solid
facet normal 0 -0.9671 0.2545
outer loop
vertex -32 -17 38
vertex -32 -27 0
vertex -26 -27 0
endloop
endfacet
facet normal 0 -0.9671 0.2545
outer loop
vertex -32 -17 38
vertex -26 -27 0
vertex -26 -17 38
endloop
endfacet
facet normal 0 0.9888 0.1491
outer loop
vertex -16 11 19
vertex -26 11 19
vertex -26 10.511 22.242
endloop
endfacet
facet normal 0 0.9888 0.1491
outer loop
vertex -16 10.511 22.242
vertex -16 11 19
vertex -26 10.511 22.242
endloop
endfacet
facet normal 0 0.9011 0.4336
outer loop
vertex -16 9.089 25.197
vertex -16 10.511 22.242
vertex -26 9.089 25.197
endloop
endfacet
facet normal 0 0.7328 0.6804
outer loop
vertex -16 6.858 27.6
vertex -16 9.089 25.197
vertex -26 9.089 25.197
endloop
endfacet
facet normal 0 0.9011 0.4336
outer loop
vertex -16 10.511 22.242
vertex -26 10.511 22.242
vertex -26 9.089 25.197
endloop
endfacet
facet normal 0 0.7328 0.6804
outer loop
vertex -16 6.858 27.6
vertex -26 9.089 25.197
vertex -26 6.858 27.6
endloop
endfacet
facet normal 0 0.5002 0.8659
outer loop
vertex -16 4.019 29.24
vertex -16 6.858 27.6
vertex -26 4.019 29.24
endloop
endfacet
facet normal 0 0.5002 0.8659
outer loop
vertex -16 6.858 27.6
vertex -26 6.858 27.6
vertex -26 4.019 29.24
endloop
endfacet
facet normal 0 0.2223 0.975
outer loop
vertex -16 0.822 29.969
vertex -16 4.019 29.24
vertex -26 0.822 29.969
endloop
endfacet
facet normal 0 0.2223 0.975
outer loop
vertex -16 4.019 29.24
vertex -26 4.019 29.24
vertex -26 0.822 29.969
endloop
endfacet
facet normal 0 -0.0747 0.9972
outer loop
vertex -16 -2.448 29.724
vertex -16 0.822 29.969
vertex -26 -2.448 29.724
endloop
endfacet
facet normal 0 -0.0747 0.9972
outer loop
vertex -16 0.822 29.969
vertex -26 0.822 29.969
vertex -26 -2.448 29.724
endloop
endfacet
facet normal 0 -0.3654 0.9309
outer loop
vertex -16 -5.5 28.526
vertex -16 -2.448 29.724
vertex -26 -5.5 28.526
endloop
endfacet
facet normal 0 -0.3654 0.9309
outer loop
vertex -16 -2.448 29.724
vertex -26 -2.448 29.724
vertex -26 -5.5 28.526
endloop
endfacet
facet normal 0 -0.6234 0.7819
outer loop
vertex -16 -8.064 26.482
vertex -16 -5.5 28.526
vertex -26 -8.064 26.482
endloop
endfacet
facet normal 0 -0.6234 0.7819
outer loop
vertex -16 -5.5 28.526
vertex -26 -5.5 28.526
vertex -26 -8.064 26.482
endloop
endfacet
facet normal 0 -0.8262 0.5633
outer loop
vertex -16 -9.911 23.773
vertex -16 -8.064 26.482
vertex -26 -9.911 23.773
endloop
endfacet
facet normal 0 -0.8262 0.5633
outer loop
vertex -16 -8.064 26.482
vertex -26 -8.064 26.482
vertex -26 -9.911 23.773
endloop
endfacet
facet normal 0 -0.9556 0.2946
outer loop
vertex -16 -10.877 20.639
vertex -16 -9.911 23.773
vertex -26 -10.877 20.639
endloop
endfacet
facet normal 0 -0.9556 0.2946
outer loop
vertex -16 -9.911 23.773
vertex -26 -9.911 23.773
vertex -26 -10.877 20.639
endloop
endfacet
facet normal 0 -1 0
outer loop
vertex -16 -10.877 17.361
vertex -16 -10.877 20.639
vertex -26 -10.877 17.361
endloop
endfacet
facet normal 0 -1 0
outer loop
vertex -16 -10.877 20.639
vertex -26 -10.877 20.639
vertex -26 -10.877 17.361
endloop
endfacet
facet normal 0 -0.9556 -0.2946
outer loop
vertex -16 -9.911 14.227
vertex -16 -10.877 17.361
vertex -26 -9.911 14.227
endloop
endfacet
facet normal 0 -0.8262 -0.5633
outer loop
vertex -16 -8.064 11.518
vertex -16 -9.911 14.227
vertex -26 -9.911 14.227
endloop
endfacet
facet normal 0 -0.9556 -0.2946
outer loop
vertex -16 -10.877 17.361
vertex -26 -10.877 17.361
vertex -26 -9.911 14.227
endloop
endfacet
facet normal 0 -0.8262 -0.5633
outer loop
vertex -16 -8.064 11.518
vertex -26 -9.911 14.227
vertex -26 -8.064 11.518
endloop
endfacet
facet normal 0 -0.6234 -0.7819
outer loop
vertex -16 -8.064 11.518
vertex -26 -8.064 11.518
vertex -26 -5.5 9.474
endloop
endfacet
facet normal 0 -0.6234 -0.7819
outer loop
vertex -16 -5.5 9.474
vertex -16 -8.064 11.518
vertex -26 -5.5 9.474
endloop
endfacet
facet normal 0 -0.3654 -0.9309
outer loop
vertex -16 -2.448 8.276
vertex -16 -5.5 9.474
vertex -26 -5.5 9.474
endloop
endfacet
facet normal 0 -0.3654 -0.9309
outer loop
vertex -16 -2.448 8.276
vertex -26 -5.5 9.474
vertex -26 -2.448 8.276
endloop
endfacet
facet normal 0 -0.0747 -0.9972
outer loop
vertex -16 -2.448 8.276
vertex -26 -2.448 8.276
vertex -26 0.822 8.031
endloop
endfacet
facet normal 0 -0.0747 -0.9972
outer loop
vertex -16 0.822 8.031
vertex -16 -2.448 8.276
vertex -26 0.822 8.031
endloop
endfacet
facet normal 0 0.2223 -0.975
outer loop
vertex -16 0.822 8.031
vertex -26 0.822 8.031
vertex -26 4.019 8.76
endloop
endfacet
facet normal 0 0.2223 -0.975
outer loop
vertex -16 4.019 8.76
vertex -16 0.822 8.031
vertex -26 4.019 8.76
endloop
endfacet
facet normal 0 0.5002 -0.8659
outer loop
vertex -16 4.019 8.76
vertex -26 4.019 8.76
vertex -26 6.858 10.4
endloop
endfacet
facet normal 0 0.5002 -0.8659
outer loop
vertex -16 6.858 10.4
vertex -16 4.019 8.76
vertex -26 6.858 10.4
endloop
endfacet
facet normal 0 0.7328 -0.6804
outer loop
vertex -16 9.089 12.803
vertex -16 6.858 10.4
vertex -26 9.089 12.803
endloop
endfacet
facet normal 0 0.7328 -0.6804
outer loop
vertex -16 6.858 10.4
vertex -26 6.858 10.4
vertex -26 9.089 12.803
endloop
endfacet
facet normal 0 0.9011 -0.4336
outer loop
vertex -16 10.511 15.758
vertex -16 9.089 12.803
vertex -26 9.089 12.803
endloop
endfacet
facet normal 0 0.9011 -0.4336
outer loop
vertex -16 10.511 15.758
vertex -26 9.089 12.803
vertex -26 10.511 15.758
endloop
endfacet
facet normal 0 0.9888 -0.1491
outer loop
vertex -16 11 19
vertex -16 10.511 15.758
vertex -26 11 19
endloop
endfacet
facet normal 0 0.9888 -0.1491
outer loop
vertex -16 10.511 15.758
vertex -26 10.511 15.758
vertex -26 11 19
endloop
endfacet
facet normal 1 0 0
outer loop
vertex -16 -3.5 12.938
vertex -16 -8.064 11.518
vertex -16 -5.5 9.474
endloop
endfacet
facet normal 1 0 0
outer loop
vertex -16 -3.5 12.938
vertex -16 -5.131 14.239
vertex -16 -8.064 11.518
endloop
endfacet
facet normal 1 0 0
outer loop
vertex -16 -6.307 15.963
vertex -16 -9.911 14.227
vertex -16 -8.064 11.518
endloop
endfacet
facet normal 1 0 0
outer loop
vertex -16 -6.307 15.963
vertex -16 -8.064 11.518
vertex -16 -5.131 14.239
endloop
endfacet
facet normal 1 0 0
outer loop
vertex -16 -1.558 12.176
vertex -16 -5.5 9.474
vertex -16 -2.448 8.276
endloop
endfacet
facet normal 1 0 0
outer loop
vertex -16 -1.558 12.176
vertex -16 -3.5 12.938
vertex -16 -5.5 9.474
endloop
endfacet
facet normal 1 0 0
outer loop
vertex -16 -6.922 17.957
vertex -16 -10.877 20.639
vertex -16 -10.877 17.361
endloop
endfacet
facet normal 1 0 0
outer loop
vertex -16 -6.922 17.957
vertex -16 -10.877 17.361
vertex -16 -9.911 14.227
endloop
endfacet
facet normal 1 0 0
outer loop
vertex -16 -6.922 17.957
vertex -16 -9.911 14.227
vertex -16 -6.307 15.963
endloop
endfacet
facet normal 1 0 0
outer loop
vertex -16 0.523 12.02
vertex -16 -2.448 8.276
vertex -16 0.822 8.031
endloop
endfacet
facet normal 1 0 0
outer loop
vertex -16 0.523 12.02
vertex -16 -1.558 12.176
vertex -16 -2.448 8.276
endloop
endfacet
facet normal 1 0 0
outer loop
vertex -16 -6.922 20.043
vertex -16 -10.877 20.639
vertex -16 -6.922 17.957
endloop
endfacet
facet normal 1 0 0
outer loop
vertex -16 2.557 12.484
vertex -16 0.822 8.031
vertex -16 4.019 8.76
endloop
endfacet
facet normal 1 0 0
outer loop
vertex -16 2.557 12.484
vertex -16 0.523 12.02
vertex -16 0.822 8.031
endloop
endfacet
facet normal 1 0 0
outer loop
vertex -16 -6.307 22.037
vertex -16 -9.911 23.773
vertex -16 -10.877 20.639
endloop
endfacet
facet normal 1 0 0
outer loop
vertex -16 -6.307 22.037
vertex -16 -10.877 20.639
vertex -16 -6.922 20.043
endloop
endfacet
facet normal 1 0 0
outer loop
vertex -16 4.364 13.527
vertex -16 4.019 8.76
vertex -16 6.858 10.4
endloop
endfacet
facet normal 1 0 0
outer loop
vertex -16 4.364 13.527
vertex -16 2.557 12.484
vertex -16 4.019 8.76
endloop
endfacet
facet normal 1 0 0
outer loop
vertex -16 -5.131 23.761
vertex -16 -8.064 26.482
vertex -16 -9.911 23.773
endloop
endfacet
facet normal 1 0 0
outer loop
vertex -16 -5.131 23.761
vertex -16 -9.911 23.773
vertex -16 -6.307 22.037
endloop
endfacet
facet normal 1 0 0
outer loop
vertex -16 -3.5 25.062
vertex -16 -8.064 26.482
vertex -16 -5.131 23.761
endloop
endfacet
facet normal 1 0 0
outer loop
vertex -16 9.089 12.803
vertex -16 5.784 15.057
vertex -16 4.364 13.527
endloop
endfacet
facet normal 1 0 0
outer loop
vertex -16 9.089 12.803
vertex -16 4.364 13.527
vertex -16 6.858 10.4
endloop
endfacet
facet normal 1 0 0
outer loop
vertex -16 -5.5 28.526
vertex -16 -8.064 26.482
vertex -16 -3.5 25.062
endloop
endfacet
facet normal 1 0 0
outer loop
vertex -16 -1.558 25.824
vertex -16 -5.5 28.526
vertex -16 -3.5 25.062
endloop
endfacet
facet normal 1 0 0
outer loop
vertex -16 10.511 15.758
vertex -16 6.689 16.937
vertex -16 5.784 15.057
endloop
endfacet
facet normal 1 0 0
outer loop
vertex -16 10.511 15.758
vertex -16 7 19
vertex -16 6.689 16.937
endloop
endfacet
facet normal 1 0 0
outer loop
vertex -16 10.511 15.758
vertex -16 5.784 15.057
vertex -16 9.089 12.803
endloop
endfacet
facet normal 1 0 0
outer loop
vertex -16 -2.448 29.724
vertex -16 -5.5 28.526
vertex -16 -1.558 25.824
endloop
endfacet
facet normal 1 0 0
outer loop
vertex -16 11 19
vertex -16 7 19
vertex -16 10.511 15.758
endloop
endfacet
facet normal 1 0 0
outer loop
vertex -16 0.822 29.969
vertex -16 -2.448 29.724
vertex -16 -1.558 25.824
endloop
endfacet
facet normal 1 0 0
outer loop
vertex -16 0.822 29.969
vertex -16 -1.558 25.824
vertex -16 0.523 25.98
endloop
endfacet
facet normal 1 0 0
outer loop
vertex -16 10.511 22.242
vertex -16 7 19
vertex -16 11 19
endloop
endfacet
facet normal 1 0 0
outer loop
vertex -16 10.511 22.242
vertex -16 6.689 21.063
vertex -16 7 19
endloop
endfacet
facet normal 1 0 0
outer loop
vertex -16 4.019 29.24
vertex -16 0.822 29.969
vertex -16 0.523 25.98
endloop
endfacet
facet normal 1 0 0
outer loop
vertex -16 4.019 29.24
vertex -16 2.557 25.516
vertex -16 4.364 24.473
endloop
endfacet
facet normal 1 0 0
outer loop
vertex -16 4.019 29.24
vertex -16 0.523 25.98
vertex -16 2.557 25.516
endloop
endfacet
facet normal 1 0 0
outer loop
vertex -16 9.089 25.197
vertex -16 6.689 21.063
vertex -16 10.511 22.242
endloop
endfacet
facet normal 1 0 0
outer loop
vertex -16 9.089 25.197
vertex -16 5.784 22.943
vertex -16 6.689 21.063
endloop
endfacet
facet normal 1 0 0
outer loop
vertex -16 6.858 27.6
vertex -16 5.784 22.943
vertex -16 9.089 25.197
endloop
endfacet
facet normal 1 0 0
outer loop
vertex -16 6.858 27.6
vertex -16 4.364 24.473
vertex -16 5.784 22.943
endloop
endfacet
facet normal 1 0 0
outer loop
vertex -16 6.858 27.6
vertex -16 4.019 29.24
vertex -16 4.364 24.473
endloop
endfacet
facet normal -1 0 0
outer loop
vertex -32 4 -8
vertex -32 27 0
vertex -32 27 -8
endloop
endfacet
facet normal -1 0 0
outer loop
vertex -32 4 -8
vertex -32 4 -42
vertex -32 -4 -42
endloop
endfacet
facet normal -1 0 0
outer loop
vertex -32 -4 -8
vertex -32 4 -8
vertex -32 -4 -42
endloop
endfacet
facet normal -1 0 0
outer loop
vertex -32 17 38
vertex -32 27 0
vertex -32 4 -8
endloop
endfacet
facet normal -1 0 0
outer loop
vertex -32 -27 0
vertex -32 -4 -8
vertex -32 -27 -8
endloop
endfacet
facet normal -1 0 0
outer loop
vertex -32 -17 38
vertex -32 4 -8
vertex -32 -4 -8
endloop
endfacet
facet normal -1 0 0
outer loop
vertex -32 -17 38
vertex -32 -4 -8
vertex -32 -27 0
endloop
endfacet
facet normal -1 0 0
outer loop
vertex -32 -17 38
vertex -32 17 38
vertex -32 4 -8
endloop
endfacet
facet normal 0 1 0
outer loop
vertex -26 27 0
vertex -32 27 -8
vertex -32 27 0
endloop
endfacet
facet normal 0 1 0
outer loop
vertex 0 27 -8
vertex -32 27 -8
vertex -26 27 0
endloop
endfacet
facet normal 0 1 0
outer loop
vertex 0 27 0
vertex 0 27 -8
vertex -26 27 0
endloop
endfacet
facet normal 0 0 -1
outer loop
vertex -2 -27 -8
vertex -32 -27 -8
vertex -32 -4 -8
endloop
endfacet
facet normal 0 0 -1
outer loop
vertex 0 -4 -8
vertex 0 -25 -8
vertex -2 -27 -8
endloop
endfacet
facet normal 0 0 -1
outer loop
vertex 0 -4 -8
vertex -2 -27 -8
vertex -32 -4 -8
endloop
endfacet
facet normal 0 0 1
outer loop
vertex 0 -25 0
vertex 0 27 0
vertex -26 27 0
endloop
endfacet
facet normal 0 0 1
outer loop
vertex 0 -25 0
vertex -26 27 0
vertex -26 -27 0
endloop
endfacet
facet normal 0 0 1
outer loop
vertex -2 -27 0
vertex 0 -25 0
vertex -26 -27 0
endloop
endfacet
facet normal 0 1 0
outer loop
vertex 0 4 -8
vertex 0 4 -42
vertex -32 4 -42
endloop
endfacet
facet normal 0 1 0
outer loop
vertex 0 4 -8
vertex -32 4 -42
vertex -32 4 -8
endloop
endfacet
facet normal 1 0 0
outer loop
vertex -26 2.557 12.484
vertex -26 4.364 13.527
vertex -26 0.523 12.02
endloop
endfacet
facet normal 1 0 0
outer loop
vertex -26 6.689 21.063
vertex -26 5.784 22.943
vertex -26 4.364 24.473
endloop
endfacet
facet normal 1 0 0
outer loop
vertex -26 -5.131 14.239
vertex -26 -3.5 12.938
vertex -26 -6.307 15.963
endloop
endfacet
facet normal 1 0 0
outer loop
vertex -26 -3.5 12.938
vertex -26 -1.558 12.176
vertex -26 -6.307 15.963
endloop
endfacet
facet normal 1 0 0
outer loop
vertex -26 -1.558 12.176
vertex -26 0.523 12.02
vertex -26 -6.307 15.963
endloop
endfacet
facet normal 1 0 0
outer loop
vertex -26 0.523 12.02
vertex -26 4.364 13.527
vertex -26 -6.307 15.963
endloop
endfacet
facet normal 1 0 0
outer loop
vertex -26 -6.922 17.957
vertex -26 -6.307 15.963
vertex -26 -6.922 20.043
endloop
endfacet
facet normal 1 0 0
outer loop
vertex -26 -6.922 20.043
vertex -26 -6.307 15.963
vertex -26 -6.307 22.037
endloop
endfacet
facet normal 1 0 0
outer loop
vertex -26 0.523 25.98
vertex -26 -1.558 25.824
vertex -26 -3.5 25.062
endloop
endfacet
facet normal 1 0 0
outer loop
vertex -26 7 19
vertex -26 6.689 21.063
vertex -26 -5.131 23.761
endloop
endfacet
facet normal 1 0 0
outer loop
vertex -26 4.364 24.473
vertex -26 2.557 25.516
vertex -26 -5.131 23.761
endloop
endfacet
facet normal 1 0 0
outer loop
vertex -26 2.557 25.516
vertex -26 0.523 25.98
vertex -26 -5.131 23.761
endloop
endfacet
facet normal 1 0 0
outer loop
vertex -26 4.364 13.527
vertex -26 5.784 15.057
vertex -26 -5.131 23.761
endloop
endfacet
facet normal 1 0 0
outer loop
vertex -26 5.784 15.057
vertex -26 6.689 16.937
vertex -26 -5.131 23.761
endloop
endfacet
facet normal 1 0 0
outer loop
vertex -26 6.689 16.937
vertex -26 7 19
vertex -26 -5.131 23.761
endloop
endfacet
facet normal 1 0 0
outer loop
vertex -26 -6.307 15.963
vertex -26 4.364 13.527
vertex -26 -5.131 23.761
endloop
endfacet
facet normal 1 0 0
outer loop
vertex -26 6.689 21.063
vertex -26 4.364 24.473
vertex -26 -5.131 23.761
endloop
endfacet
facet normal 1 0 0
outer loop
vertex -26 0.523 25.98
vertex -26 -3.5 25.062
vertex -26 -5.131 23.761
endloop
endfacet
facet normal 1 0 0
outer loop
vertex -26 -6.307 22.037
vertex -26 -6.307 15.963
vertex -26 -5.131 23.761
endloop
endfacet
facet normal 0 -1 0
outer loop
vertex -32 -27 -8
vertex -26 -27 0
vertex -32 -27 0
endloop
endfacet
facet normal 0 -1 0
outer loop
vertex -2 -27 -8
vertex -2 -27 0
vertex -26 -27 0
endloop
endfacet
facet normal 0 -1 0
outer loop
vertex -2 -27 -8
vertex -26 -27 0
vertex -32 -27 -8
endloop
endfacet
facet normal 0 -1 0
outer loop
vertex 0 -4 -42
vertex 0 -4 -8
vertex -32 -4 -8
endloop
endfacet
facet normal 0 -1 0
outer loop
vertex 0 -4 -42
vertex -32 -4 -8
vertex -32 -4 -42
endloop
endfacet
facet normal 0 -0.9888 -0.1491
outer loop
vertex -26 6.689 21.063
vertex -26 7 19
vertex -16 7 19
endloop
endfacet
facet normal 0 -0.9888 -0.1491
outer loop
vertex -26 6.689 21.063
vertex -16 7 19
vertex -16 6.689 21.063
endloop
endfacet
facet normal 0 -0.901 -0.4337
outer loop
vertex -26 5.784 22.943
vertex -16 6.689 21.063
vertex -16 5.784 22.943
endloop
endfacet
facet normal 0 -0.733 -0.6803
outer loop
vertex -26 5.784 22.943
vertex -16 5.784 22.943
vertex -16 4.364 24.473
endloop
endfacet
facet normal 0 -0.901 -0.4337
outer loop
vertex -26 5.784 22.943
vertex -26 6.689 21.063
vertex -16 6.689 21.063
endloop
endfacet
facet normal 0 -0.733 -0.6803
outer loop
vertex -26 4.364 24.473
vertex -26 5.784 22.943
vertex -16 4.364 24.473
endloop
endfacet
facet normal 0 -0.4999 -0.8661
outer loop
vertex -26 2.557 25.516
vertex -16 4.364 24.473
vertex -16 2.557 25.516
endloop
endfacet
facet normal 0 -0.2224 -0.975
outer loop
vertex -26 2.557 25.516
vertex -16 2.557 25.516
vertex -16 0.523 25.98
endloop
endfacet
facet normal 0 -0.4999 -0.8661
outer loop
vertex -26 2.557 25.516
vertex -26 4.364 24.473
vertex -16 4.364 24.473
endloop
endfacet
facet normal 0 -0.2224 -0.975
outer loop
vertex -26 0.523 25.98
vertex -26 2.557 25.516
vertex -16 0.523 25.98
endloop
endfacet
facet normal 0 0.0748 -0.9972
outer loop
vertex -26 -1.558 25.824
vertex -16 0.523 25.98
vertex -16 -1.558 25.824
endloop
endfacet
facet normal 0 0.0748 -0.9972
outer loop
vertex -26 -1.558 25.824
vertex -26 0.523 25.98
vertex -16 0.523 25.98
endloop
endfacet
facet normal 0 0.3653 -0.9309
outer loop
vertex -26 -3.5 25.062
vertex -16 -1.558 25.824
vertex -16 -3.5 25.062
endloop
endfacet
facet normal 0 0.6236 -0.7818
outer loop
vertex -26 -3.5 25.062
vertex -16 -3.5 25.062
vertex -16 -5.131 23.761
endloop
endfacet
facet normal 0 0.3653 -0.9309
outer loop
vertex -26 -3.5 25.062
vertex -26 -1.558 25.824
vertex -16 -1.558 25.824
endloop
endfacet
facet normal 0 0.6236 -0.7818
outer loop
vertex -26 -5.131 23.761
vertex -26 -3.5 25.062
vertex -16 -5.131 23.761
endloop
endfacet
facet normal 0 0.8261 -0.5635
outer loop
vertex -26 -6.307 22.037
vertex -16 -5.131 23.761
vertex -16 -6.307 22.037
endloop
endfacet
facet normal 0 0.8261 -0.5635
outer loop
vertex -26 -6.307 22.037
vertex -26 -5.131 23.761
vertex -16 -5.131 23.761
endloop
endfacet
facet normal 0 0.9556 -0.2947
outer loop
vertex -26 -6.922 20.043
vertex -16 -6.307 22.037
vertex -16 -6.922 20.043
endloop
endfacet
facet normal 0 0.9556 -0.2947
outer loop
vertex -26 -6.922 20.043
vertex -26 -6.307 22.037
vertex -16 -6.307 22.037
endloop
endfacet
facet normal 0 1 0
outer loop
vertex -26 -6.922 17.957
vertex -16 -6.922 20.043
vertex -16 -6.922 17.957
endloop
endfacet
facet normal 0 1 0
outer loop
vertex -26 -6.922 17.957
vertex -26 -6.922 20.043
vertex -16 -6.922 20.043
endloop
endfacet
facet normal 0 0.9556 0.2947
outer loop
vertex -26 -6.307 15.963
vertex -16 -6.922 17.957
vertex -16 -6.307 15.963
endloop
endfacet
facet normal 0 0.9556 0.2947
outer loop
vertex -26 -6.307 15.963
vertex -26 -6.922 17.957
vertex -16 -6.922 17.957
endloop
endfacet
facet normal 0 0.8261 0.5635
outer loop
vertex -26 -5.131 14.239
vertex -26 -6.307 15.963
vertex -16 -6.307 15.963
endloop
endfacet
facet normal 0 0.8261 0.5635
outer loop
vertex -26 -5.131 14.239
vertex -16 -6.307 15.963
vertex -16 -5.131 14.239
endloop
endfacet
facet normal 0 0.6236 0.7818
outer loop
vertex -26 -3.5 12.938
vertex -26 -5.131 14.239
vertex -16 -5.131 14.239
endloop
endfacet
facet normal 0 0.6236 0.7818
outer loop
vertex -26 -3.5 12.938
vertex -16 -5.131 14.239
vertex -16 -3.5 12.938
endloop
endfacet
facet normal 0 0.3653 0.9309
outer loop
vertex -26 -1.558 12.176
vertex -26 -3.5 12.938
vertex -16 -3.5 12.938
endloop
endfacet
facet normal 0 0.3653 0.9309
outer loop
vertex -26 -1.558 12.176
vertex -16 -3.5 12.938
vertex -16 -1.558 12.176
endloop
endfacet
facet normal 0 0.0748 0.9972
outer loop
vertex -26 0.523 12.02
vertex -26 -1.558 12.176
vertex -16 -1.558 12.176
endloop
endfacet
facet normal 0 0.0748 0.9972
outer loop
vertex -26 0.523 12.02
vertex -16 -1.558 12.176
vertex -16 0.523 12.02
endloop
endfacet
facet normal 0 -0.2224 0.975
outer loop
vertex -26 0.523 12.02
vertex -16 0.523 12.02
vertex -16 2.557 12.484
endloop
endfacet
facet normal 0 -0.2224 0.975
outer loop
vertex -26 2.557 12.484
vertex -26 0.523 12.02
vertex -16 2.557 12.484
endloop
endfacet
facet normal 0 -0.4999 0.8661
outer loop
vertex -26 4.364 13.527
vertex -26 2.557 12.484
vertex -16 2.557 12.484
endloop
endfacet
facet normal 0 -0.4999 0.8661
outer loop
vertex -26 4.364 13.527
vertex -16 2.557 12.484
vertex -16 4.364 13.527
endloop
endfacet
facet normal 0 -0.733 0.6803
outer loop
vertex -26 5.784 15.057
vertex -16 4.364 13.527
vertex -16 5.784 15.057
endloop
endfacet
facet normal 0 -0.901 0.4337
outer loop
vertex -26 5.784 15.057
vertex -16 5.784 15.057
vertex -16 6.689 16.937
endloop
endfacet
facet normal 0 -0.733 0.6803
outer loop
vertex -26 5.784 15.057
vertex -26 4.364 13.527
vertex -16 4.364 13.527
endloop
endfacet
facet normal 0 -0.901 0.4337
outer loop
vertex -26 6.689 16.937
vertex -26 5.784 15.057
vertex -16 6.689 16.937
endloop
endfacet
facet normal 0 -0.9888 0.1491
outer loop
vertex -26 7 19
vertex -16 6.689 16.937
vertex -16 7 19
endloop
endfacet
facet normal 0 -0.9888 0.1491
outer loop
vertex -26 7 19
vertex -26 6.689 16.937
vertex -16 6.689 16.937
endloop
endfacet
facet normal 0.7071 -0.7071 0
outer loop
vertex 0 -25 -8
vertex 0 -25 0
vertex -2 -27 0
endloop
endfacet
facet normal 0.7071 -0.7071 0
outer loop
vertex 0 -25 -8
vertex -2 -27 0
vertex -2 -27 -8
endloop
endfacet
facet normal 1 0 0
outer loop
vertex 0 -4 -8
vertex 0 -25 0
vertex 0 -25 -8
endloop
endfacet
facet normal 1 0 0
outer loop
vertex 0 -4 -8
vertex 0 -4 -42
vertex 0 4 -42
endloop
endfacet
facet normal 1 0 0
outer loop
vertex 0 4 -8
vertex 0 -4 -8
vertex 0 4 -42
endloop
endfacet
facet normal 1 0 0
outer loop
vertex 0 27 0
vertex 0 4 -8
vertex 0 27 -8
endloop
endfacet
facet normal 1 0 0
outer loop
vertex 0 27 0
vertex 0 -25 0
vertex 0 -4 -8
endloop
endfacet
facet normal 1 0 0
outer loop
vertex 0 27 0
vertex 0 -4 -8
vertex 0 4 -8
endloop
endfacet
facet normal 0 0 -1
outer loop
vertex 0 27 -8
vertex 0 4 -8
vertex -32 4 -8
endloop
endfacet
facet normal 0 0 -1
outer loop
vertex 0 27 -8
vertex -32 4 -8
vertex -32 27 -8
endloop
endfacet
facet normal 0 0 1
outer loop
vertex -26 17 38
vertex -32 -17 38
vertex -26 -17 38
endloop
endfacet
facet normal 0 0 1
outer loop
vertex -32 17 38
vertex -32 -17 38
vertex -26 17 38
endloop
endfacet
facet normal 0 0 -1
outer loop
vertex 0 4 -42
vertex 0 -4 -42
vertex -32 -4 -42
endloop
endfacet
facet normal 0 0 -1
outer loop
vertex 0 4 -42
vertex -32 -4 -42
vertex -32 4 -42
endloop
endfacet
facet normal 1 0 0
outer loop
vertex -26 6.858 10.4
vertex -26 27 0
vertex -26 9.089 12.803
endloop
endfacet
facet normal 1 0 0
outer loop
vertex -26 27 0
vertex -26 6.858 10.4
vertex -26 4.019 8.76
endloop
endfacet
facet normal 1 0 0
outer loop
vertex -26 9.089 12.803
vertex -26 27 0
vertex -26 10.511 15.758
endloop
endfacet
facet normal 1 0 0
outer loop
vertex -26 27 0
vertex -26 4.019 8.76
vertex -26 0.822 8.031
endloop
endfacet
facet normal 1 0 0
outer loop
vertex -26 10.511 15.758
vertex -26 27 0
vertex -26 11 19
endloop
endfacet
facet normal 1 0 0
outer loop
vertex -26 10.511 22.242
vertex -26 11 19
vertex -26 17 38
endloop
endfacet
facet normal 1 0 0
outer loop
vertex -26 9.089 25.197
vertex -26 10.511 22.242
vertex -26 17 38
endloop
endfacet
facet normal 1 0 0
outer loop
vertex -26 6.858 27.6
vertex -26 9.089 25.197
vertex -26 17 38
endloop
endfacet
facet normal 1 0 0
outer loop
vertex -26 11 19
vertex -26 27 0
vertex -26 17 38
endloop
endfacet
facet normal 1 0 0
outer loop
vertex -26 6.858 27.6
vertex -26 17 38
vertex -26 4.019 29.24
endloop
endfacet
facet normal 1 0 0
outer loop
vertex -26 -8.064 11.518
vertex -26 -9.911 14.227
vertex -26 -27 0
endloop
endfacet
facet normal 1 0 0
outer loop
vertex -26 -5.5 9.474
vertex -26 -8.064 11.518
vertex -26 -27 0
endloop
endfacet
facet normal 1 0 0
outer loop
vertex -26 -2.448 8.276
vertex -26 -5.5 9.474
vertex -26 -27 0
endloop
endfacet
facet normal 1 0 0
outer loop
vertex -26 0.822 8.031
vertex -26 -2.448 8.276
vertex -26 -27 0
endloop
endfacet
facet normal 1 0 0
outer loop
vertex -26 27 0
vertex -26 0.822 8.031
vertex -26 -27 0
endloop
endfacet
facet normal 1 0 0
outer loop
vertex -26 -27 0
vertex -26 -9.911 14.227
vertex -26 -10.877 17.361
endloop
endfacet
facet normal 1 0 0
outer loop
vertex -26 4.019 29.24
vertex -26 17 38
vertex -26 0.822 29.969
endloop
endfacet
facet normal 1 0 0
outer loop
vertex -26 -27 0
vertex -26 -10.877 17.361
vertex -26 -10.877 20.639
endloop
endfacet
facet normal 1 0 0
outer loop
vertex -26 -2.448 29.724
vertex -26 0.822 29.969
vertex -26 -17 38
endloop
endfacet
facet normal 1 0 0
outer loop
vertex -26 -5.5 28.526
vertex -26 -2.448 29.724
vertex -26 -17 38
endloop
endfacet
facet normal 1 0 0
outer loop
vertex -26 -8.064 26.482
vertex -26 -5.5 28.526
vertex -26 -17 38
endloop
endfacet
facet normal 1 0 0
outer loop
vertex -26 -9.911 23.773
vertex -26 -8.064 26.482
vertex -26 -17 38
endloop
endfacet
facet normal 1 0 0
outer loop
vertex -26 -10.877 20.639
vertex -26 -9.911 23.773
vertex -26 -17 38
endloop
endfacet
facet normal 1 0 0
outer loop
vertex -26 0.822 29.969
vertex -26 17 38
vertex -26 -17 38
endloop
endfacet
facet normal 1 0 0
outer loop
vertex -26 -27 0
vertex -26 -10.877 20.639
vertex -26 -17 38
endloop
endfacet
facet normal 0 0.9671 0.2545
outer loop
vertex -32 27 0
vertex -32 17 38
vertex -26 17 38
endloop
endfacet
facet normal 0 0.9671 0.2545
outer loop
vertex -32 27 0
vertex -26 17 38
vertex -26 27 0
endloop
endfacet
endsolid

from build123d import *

# Parameters (mm, degrees)
F1_DEPTH = 32
F3_DEPTH = 6
F4_R     = 11
F4_R_2   = 7
F5_DEPTH = 10
F6_SIZE  = 2


with BuildPart() as f1:
    # F0 (on Right) → F1 (new body)
    with BuildSketch(Plane.YZ):
        Polygon((27, 0), (-27, 0), (-27, -8), (-4, -8), (-4, -42), (4, -42), (4, -8), (27, -8), align=None)
    extrude(amount=-F1_DEPTH)

    # F2 (on face) → F3 (join)
    with BuildSketch(Plane(origin=(-32, 0, 0), x_dir=(0, -1, 0), z_dir=(-1, 0, 0))):
        Polygon((-27, 0), (27, 0), (17, 38), (-17, 38), align=None)
    extrude(amount=-F3_DEPTH)

    # F4 (on face) → F5 (join)
    with BuildSketch(Plane.YZ.offset(-26)):
        with Locations((0, 19)):
            Circle(F4_R)
        with Locations((0, 19)):
            Circle(F4_R_2, mode=Mode.SUBTRACT)
    extrude(amount=F5_DEPTH)

    # F6
    f6_edges = [f1.edges().sort_by_distance(p)[0] for p in [
        (0, -27, -4),
    ]]
    chamfer(f6_edges, length=F6_SIZE)


solid = f1.part
